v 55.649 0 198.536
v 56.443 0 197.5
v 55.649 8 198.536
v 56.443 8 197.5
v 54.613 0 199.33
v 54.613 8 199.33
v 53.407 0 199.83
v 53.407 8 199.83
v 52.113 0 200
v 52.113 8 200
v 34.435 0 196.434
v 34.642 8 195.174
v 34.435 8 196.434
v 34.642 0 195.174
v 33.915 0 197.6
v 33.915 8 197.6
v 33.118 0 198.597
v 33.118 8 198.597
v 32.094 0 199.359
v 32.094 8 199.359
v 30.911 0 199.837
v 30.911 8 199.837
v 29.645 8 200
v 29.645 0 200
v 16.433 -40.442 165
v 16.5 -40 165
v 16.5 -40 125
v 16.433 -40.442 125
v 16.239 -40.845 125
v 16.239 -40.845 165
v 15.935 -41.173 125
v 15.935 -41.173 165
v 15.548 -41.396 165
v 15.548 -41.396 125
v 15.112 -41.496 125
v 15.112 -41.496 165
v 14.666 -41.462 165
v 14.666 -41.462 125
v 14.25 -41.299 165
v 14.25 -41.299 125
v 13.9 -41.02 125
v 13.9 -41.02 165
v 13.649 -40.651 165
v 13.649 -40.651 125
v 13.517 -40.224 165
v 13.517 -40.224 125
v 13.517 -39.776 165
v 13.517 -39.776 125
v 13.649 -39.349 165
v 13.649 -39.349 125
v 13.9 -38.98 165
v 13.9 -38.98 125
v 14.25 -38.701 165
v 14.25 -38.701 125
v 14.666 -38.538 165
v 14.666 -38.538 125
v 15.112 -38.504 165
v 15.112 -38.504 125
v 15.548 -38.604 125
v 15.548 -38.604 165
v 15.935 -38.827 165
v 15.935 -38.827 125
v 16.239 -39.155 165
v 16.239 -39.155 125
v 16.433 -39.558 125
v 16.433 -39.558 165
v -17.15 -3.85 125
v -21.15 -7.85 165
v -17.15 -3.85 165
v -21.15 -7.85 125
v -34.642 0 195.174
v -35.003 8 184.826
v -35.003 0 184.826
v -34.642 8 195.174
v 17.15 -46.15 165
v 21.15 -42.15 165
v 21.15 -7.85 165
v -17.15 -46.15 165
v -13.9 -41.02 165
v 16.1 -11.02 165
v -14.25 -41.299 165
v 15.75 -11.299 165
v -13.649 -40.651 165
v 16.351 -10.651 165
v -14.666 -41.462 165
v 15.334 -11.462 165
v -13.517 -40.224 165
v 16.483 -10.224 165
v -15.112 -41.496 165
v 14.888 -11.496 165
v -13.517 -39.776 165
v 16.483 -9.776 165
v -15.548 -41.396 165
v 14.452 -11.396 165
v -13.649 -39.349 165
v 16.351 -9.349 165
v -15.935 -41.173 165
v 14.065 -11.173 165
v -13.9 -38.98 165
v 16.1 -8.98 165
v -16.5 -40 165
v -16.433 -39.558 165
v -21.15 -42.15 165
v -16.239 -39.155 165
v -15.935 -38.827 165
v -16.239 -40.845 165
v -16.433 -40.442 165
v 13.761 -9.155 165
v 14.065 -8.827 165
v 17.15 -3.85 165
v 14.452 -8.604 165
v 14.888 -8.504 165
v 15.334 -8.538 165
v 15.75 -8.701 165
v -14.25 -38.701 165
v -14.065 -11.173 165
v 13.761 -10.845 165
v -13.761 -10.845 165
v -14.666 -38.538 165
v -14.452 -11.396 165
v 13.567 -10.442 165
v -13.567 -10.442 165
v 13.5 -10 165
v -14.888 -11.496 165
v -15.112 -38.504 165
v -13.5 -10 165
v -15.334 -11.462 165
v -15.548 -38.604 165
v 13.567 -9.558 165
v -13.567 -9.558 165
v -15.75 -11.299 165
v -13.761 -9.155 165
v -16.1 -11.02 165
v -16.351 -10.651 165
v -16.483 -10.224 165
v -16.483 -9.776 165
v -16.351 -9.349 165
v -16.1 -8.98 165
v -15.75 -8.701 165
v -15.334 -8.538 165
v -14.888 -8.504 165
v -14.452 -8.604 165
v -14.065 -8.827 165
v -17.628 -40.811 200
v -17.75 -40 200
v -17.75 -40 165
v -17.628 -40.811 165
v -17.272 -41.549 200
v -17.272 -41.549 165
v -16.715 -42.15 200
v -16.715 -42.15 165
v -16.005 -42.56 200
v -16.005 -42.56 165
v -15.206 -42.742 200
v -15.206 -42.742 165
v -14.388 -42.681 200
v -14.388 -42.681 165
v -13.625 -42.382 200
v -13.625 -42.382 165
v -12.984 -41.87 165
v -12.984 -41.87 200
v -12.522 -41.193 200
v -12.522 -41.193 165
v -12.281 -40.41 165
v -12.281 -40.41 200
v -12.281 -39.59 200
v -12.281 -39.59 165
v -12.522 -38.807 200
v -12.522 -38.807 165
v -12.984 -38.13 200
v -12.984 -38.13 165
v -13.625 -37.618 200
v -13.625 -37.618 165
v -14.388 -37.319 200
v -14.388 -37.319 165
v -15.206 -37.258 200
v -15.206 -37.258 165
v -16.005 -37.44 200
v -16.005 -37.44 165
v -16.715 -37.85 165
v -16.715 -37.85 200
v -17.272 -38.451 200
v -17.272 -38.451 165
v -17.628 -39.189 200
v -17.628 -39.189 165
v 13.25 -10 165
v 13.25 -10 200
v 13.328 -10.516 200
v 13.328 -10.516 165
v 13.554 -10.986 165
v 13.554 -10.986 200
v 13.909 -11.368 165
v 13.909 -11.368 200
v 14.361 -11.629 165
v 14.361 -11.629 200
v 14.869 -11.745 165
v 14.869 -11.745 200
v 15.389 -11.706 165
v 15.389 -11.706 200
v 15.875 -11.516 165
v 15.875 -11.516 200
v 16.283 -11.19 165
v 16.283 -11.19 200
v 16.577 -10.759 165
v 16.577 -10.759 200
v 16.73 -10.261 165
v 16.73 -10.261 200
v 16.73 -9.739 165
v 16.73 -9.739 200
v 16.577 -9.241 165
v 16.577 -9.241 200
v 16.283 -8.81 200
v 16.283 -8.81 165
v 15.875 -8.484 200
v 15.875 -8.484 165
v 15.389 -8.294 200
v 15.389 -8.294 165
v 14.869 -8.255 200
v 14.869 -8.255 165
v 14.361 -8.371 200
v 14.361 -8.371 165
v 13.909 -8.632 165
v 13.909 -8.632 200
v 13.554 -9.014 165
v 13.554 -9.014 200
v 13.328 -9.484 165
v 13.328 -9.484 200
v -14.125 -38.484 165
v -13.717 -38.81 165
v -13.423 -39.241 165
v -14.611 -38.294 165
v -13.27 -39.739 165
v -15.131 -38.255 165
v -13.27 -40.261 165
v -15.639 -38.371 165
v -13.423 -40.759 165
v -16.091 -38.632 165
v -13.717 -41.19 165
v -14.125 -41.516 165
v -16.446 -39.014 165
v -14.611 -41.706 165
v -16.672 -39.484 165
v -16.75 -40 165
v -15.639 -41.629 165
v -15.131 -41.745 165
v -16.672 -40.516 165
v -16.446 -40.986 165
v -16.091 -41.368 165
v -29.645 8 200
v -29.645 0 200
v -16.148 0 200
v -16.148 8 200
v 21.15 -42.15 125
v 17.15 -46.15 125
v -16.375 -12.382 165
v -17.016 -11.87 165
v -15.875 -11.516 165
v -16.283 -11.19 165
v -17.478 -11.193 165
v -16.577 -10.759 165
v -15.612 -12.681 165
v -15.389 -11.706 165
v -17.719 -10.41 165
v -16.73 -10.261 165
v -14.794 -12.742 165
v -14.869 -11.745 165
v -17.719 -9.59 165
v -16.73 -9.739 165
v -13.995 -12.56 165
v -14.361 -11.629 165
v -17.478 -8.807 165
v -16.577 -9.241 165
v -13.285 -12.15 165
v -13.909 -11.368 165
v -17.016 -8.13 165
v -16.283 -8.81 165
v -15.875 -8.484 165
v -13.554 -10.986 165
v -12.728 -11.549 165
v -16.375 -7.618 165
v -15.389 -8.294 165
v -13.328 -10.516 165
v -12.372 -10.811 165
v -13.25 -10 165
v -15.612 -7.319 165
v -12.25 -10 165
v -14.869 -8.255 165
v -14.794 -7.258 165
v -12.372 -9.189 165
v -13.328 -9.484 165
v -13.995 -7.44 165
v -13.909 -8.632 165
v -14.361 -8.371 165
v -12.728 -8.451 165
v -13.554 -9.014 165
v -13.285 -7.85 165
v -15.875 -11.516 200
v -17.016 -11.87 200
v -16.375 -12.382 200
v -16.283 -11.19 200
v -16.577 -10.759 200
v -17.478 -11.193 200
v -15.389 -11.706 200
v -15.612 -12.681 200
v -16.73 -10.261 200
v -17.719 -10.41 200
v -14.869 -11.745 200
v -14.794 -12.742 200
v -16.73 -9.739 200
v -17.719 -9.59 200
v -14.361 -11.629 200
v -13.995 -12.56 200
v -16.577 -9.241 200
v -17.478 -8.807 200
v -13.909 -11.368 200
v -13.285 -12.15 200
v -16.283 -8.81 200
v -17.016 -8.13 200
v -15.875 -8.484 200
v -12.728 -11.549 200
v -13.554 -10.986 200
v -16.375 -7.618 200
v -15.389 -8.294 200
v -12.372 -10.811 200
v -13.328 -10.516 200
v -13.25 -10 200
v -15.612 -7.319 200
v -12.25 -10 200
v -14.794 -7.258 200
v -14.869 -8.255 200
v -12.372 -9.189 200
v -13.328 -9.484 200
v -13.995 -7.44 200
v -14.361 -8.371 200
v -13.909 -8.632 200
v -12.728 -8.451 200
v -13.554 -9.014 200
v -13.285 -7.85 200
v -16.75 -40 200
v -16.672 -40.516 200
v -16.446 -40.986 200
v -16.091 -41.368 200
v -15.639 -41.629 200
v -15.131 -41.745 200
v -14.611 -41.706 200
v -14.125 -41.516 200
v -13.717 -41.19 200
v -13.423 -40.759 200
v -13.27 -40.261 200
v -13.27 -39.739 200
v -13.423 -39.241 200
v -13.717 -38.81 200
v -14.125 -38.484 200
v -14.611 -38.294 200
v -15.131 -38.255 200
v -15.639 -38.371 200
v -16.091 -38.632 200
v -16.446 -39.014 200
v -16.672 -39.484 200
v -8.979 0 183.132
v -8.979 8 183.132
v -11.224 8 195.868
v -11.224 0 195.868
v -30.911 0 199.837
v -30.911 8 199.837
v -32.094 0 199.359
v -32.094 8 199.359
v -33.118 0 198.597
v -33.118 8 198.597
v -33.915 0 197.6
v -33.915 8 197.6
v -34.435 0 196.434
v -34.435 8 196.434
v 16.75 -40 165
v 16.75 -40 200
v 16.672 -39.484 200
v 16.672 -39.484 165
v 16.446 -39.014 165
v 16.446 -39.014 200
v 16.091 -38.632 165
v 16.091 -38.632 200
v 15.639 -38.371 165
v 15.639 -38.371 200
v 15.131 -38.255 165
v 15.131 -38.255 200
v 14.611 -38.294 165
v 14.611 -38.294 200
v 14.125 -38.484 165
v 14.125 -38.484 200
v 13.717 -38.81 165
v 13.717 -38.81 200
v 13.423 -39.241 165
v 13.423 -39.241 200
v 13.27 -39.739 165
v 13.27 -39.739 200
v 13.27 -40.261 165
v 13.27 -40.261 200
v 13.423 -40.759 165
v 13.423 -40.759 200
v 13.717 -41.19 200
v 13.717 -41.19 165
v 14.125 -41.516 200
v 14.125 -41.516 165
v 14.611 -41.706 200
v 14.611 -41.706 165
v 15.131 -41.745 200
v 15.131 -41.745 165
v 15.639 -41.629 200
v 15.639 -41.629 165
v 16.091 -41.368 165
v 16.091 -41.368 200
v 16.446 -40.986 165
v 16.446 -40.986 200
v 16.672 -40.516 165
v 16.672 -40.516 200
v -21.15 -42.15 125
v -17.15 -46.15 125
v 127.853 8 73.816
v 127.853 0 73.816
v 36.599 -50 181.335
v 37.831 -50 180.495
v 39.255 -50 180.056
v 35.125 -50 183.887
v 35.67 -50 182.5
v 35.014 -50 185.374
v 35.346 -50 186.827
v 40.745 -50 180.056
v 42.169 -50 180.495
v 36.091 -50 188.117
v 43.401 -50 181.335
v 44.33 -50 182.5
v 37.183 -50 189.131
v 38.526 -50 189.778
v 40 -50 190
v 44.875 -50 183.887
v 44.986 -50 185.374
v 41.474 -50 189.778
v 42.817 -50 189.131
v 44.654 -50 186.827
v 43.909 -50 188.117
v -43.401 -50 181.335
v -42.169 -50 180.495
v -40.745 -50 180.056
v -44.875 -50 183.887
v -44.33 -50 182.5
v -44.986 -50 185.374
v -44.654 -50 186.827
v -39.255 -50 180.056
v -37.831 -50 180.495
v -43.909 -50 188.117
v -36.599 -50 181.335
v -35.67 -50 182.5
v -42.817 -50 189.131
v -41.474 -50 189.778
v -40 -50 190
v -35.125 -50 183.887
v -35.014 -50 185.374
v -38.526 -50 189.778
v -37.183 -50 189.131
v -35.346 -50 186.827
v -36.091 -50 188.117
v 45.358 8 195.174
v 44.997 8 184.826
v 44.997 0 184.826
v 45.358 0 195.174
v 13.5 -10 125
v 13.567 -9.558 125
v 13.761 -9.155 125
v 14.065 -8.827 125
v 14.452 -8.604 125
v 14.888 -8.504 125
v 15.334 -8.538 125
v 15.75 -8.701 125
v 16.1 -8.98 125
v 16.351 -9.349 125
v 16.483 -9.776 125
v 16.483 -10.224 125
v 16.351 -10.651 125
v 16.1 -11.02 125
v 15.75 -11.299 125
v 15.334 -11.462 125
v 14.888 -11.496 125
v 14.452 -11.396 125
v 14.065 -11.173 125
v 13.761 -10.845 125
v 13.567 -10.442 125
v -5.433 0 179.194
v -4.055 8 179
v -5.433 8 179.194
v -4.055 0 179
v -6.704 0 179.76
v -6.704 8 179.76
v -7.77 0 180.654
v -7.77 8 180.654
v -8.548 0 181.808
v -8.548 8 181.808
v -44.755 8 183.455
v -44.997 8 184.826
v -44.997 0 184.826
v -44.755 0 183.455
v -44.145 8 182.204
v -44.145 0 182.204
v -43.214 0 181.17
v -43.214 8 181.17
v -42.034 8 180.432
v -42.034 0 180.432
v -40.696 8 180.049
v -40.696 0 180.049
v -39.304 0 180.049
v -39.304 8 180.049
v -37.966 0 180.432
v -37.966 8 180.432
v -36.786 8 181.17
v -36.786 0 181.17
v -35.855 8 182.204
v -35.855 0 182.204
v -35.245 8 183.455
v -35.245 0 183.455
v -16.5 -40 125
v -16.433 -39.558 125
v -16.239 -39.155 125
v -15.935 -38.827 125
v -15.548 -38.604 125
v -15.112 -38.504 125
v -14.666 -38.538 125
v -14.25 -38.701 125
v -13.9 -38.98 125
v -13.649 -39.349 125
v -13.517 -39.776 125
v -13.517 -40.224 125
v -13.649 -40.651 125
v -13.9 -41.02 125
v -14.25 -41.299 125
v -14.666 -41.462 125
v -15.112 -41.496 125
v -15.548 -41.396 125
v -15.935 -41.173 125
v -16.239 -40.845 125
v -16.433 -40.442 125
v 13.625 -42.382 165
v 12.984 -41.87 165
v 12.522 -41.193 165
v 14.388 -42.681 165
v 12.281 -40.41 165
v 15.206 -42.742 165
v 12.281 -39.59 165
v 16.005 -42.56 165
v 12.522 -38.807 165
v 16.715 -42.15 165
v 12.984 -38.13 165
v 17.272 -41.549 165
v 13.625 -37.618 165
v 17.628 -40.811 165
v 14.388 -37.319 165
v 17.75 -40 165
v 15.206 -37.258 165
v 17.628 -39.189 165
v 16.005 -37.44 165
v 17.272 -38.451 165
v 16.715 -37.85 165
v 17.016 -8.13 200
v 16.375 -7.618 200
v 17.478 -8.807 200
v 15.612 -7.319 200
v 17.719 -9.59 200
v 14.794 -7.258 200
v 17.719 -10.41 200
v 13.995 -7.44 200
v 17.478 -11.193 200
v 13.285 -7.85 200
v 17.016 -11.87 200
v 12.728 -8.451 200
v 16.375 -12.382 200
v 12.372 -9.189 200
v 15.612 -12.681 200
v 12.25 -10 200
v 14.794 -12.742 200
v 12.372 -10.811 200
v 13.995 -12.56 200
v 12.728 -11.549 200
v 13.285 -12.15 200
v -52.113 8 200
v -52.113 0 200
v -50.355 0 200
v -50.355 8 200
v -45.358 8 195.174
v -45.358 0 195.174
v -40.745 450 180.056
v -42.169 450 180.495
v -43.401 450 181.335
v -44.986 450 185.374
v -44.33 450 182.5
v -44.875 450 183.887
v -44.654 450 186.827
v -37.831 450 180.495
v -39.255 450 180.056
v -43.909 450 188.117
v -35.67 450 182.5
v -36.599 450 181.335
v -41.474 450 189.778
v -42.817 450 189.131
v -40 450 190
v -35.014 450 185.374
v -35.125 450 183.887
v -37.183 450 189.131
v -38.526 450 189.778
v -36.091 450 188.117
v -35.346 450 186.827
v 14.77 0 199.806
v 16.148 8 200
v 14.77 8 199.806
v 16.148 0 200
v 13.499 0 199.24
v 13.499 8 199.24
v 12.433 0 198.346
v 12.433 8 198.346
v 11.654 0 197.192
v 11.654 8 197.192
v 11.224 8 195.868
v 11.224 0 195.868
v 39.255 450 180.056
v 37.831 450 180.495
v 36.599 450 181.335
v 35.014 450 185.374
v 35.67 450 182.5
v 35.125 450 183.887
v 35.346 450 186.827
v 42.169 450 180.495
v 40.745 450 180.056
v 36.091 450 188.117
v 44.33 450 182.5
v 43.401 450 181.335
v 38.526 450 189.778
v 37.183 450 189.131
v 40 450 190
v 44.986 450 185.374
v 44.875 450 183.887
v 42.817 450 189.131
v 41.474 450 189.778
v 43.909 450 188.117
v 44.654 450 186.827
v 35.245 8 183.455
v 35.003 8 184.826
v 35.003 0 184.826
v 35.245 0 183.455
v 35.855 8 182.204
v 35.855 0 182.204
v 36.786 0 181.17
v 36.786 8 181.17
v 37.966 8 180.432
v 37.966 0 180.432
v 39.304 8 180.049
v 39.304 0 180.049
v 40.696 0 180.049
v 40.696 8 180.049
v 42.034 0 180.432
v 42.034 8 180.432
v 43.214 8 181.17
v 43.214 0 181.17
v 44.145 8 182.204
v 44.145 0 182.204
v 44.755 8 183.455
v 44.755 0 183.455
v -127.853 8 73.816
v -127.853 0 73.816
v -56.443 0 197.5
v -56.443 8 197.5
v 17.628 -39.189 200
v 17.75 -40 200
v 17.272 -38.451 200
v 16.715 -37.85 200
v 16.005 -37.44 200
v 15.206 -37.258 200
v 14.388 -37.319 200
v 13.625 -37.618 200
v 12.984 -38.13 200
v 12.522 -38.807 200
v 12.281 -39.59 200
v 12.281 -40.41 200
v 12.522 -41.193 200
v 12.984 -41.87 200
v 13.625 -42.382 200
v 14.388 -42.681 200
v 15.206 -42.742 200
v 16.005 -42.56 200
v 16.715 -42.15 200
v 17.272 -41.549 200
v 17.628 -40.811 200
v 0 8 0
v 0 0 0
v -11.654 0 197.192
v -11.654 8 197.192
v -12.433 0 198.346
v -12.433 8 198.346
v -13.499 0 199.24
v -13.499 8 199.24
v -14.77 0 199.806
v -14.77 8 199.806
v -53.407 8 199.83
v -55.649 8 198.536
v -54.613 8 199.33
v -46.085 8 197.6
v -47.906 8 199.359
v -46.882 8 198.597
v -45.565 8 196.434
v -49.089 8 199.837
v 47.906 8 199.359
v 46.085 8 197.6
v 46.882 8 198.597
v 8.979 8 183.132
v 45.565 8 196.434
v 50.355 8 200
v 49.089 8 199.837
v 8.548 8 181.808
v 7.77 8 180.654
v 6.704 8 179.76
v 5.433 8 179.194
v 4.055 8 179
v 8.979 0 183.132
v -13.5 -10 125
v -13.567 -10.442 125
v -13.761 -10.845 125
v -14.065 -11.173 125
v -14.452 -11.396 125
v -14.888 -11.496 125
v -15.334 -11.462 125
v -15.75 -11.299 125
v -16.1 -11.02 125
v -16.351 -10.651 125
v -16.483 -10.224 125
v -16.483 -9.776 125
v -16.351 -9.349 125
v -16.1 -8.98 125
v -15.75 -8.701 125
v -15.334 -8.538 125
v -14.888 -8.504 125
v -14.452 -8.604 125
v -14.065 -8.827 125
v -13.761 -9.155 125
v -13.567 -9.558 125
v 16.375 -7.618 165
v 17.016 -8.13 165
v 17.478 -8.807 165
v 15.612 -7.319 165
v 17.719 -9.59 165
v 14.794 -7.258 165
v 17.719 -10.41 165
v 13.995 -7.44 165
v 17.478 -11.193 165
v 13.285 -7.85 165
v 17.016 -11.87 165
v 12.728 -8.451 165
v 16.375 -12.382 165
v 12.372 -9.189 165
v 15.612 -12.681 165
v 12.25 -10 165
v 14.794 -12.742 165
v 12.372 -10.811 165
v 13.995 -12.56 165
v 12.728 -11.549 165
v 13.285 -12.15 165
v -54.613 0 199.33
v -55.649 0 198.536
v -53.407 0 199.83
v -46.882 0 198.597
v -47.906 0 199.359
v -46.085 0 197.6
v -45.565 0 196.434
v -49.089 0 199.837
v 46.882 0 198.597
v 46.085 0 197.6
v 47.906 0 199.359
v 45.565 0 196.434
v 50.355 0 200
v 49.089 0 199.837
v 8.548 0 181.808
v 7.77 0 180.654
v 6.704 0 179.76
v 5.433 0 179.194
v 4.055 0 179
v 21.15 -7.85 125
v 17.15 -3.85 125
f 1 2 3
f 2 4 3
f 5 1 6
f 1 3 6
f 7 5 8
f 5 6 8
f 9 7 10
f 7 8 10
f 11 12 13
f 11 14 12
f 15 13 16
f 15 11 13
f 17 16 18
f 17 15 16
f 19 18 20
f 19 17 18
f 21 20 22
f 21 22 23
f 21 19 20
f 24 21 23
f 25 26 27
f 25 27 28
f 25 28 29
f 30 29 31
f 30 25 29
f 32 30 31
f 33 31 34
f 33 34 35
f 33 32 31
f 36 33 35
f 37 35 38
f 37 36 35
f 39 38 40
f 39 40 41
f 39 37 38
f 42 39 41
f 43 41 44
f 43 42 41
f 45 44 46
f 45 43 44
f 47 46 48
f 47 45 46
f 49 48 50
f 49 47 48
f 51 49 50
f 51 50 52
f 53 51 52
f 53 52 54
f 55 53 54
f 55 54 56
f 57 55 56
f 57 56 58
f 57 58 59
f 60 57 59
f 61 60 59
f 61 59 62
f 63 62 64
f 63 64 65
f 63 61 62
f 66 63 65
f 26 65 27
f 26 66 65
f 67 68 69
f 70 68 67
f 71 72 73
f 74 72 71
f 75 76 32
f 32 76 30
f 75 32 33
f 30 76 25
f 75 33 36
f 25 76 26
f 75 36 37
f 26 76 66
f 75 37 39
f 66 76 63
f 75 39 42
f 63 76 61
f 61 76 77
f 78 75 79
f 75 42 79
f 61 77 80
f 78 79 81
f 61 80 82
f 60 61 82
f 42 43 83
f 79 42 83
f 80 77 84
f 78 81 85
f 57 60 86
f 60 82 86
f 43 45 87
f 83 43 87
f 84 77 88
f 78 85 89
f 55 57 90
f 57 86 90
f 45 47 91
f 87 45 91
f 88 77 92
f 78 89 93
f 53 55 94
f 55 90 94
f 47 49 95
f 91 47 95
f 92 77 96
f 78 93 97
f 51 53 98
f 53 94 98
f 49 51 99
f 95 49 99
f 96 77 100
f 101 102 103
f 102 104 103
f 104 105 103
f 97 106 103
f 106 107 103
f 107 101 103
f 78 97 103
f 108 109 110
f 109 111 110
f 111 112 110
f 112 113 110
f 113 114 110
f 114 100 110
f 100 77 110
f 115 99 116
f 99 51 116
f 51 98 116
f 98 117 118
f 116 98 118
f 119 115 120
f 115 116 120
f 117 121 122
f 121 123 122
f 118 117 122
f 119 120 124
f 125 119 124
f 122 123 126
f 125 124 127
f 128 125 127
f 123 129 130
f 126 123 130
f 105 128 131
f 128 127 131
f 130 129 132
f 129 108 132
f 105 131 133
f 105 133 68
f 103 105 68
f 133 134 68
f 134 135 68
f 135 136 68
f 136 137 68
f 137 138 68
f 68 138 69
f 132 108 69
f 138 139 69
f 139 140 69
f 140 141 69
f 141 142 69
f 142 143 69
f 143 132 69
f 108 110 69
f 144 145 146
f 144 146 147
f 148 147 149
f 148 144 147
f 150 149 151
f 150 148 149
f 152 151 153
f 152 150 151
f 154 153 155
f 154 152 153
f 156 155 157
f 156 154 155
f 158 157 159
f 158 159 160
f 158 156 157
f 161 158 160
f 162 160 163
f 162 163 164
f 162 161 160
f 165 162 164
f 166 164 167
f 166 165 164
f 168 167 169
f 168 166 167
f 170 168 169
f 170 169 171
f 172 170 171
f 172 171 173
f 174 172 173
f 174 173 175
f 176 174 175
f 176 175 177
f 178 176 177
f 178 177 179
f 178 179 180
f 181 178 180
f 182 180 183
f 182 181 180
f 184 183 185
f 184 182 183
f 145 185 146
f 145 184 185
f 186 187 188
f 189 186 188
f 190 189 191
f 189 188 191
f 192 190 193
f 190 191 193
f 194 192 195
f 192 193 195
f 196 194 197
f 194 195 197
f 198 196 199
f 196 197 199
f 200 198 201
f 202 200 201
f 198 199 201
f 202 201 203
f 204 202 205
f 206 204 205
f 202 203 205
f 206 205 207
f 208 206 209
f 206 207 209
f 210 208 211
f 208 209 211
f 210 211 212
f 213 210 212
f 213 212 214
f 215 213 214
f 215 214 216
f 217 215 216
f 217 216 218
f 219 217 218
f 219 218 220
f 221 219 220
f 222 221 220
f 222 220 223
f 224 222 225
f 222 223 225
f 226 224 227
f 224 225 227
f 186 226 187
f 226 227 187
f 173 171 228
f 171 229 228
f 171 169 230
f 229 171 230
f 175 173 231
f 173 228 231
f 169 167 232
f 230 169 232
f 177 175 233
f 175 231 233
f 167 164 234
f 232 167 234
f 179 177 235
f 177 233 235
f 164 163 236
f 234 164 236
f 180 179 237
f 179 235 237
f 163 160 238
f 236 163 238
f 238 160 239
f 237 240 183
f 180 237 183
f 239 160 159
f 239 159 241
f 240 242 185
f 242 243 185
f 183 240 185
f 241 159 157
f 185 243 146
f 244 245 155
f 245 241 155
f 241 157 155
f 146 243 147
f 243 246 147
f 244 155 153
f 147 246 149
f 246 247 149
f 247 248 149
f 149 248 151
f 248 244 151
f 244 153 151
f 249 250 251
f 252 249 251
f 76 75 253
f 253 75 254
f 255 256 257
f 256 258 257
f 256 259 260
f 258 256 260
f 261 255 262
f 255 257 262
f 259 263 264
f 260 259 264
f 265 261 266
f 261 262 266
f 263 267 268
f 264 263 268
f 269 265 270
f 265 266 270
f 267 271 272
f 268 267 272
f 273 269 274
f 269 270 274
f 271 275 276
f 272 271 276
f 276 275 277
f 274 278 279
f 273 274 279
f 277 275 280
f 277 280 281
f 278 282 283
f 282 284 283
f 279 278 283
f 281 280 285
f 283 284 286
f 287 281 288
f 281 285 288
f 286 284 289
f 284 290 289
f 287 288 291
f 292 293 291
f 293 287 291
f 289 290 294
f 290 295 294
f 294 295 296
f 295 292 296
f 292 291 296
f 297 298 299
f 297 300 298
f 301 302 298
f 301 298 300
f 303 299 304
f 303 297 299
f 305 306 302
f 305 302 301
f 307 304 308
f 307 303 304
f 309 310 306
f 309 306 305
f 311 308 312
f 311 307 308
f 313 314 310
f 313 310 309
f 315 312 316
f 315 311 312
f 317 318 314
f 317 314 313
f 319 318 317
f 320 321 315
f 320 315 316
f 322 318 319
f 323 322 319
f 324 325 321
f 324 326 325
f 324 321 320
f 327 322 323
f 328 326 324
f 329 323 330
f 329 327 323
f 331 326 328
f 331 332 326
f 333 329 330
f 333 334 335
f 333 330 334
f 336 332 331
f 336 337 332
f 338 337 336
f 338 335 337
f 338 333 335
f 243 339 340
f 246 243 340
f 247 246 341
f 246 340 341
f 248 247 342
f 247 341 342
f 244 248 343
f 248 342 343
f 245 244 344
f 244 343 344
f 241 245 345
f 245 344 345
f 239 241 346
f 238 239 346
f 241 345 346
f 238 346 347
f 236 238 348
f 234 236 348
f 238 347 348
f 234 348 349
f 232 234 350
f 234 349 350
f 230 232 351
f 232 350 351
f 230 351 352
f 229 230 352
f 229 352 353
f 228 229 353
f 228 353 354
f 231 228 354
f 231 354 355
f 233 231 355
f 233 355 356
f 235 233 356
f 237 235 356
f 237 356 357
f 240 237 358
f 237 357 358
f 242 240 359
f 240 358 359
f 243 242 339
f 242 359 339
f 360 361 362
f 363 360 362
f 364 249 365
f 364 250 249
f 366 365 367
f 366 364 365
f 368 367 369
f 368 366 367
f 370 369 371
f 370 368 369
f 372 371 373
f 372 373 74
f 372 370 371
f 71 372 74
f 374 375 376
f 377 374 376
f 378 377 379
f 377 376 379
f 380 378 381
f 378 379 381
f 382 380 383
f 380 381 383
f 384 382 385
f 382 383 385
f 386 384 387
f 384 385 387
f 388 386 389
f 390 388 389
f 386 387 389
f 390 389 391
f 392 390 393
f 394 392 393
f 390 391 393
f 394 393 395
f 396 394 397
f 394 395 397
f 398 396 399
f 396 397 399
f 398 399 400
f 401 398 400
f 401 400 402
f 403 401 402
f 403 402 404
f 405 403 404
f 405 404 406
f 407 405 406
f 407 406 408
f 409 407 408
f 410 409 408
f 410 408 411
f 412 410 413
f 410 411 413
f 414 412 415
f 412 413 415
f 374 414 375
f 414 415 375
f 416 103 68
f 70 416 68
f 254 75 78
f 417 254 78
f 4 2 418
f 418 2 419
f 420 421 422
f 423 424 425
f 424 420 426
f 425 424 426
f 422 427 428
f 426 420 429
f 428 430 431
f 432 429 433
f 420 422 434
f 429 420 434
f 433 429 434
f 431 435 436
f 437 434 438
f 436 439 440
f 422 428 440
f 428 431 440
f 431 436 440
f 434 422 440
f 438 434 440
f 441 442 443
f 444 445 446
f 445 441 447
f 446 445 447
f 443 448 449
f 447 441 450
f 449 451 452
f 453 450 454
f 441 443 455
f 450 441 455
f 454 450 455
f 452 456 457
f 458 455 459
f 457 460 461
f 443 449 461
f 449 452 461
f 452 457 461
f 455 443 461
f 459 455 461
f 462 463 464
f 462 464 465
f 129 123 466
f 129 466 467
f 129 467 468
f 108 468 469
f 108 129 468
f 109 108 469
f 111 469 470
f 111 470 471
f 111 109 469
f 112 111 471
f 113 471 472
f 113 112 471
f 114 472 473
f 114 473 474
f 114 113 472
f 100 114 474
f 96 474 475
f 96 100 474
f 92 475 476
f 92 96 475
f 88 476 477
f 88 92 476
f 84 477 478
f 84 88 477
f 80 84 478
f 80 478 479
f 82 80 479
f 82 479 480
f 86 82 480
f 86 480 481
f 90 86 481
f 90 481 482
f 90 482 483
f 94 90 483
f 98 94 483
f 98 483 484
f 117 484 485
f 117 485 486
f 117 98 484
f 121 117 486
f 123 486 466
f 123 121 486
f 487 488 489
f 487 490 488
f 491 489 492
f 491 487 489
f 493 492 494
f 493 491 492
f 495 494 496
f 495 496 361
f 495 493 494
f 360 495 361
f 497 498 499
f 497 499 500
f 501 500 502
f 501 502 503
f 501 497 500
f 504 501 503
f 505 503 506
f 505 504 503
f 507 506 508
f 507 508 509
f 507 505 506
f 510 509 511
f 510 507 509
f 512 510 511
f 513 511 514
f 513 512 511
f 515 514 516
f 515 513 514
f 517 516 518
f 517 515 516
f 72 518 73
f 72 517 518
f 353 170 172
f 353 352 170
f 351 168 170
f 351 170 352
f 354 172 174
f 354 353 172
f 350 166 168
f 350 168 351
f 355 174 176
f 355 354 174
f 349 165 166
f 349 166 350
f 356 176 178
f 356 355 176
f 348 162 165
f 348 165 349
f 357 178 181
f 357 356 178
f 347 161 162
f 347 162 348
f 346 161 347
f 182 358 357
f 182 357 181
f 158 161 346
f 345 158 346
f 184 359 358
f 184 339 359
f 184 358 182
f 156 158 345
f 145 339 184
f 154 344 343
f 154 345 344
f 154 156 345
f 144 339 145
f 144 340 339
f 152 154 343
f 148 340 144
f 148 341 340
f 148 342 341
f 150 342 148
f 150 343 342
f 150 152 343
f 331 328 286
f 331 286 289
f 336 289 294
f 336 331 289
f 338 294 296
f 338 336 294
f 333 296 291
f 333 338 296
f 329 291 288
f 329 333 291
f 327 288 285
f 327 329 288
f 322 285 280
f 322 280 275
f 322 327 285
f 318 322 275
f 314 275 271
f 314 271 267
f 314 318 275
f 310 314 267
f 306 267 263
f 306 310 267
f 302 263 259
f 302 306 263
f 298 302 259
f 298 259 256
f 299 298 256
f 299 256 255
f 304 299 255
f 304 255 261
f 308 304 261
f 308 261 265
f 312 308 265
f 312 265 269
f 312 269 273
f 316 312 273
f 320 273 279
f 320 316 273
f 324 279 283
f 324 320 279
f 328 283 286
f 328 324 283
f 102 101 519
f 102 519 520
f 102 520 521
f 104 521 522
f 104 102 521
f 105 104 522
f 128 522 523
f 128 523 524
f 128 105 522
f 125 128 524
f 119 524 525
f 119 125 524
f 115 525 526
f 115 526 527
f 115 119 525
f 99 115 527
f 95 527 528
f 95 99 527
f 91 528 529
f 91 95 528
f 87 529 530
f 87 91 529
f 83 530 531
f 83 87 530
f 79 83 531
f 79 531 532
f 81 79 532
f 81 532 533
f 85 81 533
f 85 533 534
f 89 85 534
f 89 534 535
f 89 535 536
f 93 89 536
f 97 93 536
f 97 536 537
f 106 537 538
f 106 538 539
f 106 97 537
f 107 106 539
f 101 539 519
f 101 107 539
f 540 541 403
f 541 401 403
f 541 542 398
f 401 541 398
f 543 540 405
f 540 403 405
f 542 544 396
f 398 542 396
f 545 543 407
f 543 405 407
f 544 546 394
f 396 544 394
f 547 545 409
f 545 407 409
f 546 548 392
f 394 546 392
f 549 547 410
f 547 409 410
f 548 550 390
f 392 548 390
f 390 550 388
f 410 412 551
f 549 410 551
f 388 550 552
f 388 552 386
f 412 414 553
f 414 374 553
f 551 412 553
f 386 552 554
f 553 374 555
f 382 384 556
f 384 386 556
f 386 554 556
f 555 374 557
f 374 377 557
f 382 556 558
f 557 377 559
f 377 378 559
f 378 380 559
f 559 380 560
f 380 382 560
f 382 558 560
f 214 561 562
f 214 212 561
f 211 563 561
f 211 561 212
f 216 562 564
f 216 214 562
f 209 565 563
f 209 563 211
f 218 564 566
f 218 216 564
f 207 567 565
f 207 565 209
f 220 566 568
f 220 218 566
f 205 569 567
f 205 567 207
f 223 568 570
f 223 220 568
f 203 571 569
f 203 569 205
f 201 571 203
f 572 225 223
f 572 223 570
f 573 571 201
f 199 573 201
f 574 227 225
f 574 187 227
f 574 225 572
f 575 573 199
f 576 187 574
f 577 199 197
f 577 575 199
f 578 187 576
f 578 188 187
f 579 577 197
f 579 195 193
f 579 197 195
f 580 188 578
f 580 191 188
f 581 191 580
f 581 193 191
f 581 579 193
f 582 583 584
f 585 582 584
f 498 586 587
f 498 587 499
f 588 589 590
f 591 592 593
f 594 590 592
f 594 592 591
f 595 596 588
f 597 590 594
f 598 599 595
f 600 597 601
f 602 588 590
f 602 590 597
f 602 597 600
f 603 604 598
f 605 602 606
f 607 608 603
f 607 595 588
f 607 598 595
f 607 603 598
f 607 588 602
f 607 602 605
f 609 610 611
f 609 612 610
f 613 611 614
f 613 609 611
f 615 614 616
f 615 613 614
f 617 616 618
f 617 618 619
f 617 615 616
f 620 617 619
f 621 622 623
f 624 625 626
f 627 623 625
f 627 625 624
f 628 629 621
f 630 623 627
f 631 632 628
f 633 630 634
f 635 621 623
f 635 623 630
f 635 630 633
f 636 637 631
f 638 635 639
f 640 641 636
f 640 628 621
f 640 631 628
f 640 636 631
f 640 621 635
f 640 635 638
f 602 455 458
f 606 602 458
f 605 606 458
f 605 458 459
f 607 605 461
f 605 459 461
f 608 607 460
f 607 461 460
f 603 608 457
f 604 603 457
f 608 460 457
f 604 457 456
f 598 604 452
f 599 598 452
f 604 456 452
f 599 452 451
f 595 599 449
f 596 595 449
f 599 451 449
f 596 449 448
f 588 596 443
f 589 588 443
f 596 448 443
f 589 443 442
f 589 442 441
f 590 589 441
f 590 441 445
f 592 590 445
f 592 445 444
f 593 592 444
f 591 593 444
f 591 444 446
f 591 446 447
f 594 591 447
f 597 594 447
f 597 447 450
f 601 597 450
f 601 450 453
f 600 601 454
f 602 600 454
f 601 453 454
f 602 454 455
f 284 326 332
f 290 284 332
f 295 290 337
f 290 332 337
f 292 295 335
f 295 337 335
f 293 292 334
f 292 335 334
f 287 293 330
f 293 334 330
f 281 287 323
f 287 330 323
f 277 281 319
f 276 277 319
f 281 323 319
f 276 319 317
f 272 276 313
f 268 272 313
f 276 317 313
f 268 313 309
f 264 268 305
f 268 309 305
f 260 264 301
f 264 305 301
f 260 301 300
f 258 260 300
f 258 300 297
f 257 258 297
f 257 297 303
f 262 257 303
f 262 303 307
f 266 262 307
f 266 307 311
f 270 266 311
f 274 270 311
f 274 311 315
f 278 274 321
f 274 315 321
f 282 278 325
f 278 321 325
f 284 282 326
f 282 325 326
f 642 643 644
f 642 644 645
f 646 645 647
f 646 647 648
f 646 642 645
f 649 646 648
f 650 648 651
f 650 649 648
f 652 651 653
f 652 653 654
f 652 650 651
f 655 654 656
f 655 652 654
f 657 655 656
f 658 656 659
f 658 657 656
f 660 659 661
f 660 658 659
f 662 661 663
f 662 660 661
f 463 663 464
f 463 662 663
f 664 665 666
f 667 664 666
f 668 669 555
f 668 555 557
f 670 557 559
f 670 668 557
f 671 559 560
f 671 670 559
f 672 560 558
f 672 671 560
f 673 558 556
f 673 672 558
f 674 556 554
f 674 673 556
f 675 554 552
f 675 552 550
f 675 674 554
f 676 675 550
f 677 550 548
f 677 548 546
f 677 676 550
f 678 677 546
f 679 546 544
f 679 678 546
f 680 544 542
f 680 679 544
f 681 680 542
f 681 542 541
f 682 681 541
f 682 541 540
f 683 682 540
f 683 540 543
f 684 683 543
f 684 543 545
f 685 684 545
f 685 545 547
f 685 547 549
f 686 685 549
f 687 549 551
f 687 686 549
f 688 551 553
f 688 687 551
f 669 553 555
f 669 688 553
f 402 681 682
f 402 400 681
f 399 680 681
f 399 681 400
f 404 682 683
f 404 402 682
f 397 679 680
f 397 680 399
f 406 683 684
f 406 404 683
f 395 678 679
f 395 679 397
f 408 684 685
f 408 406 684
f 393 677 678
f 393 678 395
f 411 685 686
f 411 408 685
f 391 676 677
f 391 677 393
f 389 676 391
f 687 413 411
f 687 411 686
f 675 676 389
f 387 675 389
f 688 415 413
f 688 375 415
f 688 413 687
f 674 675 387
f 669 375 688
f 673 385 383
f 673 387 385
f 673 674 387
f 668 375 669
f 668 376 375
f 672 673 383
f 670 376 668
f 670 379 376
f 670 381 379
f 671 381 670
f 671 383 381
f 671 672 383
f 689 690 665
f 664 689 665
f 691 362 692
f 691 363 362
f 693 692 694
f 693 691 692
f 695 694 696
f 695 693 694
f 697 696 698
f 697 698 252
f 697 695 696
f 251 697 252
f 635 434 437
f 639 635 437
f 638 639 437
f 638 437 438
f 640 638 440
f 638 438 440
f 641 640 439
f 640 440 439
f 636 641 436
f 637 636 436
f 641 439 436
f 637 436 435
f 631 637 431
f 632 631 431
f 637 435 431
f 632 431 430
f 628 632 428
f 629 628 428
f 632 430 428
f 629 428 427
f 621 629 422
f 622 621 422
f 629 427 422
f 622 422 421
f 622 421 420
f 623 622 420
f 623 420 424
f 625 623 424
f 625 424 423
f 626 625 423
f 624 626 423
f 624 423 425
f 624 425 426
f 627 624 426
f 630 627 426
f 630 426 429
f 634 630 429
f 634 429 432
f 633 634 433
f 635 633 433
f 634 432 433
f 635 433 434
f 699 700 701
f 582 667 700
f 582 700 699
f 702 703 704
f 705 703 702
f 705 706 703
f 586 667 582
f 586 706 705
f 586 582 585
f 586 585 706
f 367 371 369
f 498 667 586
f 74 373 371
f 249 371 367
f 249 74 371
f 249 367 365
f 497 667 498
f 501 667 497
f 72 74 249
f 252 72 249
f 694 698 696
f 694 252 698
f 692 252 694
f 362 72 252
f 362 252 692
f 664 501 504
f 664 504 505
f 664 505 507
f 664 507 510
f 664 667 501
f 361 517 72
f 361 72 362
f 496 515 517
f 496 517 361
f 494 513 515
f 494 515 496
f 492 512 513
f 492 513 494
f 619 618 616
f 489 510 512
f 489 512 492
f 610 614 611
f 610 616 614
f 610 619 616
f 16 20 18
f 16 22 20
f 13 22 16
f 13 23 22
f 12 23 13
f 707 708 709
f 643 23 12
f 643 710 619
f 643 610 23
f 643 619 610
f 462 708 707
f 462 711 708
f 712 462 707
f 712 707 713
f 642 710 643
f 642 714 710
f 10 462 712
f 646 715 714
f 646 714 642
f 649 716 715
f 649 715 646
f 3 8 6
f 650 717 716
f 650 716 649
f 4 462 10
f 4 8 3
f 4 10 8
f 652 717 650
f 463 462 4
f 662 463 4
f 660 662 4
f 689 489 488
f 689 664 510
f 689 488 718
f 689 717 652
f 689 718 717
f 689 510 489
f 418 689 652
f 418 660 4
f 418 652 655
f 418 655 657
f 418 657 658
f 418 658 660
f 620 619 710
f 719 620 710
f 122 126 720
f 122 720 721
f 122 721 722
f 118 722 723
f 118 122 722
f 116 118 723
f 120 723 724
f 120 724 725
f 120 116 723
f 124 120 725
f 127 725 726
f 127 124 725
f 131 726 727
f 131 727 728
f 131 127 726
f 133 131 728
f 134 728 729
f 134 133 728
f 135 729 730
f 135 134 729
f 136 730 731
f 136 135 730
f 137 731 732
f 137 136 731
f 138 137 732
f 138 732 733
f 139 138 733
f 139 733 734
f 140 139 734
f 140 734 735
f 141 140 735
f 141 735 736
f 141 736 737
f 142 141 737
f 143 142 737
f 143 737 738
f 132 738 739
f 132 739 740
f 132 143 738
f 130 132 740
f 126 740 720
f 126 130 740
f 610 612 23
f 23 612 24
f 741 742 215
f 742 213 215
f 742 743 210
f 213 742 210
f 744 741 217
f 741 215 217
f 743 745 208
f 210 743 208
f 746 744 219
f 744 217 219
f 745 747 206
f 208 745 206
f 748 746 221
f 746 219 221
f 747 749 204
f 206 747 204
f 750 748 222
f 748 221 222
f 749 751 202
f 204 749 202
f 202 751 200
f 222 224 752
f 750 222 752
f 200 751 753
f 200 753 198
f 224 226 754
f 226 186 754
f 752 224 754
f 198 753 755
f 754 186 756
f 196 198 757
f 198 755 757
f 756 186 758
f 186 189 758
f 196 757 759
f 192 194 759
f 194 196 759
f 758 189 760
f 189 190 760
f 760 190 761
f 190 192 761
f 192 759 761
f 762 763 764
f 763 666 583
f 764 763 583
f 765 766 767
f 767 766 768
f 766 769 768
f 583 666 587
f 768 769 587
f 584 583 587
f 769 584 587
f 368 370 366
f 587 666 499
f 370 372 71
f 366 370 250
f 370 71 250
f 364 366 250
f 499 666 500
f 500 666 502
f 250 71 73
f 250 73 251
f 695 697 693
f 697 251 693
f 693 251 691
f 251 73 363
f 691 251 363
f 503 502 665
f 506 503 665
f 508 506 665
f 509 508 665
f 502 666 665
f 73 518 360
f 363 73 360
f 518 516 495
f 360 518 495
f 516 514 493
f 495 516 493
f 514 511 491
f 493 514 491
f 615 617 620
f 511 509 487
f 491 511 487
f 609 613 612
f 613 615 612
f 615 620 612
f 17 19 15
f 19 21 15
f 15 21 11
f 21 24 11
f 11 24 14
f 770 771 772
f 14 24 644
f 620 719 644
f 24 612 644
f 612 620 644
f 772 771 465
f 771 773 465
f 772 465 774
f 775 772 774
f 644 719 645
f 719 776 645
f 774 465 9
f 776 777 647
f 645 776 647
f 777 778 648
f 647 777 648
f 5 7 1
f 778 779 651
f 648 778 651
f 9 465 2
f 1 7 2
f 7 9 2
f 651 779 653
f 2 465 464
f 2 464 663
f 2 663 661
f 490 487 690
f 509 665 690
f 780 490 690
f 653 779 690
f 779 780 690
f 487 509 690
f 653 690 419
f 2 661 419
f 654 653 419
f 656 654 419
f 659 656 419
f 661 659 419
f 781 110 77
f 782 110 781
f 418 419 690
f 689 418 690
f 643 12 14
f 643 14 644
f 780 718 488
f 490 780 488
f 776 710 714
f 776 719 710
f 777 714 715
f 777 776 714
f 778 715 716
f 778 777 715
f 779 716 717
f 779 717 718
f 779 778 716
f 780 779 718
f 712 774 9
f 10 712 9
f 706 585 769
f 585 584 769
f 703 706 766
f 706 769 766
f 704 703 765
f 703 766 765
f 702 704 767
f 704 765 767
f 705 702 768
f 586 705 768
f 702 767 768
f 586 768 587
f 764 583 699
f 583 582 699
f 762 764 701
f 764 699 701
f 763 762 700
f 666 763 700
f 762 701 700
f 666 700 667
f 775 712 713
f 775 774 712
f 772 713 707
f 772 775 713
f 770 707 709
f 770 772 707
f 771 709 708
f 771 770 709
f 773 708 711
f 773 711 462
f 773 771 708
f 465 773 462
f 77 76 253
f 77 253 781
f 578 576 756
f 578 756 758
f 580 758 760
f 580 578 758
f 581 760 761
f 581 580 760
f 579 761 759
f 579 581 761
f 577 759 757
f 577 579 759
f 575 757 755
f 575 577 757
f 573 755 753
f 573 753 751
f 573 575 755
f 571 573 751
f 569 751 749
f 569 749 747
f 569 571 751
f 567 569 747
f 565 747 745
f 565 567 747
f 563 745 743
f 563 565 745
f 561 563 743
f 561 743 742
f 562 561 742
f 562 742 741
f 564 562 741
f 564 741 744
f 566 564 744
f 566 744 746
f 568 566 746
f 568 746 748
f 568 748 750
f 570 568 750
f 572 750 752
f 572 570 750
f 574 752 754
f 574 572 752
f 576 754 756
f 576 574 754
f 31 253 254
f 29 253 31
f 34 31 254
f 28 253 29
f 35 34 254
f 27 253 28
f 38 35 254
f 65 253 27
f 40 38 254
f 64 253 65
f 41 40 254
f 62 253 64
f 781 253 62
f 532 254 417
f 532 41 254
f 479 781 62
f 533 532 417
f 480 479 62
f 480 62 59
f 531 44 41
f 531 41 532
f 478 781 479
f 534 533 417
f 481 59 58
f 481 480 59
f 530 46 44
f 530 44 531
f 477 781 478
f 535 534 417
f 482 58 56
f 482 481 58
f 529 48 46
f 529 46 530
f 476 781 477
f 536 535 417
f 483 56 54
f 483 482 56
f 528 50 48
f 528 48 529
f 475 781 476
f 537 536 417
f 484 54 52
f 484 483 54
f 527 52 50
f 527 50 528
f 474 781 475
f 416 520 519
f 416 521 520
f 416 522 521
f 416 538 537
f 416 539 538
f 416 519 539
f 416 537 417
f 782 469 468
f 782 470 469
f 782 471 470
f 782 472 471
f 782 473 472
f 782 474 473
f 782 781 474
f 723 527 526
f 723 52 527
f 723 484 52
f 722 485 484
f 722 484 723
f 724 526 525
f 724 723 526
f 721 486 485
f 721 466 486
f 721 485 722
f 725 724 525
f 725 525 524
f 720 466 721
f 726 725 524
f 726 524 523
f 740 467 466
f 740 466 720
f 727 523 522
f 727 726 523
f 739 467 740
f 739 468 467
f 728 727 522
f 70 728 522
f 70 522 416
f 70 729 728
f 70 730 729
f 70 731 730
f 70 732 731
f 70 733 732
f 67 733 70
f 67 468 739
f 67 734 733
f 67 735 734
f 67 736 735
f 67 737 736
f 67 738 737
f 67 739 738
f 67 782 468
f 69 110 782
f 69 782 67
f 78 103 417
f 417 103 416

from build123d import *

# Parameters (mm, degrees)
BOSS_EXTRUDE1_DEPTH        = 8
CUT_EXTRUDE1_DEPTH         = 8
CUT_EXTRUDE2_DEPTH         = 8
FILLET1_R                  = 5
BOSS_EXTRUDE2_DEPTH        = 450
BOSS_EXTRUDE2_DEPTH_BACK   = 50
SKETCH5_R                  = 5
BOSS_EXTRUDE2_2_DEPTH      = 450
BOSS_EXTRUDE2_2_DEPTH_BACK = 50
SKETCH7_R                  = 2.75
SKETCH7_R_2                = 1.75
BOSS_EXTRUDE3_DEPTH        = 35
BOSS_EXTRUDE3_2_DEPTH      = 35
BOSS_EXTRUDE3_3_DEPTH      = 35
BOSS_EXTRUDE3_4_DEPTH      = 35
SKETCH8_W                  = 42.3
SKETCH8_H                  = 42.3
SKETCH8_R                  = 1.5
BOSS_EXTRUDE4_DEPTH        = 40
CHAMFER1_SIZE              = 4


with BuildPart() as part:
    # Sketch2 → Boss-Extrude1 (new body)
    with BuildSketch(Plane(origin=(0, 0, 0), x_dir=(1, 0, 0), z_dir=(0, 1, 0))):
        Polygon((-55, -200), (55, -200), (127.852540378, -73.815698604), (0, 0), (-127.852540378, -73.815698604), align=None)
    extrude(amount=BOSS_EXTRUDE1_DEPTH)

    # Sketch4 → Cut-Extrude1 (cut)
    with BuildSketch(Plane(origin=(0, 8, 0), x_dir=(1, 0, 0), z_dir=(0, 1, 0))):
        with BuildLine():
            Line((44.996954135, -184.825502516), (45.526859264, -200))
            Line((45.526859264, -200), (34.473140736, -200))
            Line((34.473140736, -200), (35.003045865, -184.825502516))
            ThreePointArc((35.003045865, -184.825502516), (40, -180), (44.996954135, -184.825502516))
        make_face()
        with BuildLine():
            Line((-34.473140736, -200), (-45.526859264, -200))
            Line((-45.526859264, -200), (-44.996954135, -184.825502516))
            ThreePointArc((-44.996954135, -184.825502516), (-40, -180), (-35.003045865, -184.825502516))
            Line((-35.003045865, -184.825502516), (-34.473140736, -200))
        make_face()
    extrude(amount=-CUT_EXTRUDE1_DEPTH, mode=Mode.SUBTRACT)

    # Sketch6 → Cut-Extrude2 (cut)
    with BuildSketch(Plane(origin=(0, 8, 0), x_dir=(1, 0, 0), z_dir=(0, 1, 0))):
        Polygon((-8.25, -179), (-11.952866595, -200), (0, -200), (11.952866595, -200), (8.25, -179), align=None)
    extrude(amount=-CUT_EXTRUDE2_DEPTH, mode=Mode.SUBTRACT)

    # Fillet1
    fillet1_edges = [part.edges().sort_by_distance(p)[0] for p in [
        (45.526859264, 4, 200),
        (34.473140736, 4, 200),
        (-34.473140736, 4, 200),
        (-45.526859264, 4, 200),
        (-55, 4, 200),
        (55, 4, 200),
        (-11.952866595, 4, 200),
        (-8.25, 4, 179),
        (11.952866595, 4, 200),
        (8.25, 4, 179),
    ]]
    fillet(fillet1_edges, radius=FILLET1_R)


with BuildPart() as body_2:
    # Sketch5 → Boss-Extrude2 (new, two sides: drawn at the far end of the back side and taken through both)
    with BuildSketch(Plane(origin=(0, 0, 0), x_dir=(1, 0, 0), z_dir=(0, 1, 0)).offset(-BOSS_EXTRUDE2_DEPTH_BACK)):
        with Locations((40, -185)):
            Circle(SKETCH5_R)
    extrude(amount=BOSS_EXTRUDE2_DEPTH + BOSS_EXTRUDE2_DEPTH_BACK)


with BuildPart() as body_3:
    # Sketch5 → Boss-Extrude2 2 (new, two sides: drawn at the far end of the back side and taken through both)
    with BuildSketch(Plane(origin=(0, 0, 0), x_dir=(1, 0, 0), z_dir=(0, 1, 0)).offset(-BOSS_EXTRUDE2_2_DEPTH_BACK)):
        with Locations((-40, -185)):
            Circle(SKETCH5_R)
    extrude(amount=BOSS_EXTRUDE2_2_DEPTH + BOSS_EXTRUDE2_2_DEPTH_BACK)


with BuildPart() as body_4:
    # Sketch7 → Boss-Extrude3 (new body)
    with BuildSketch(Plane.XY.offset(200)):
        with Locations((-15, -10)):
            Circle(SKETCH7_R)
        with Locations((-15, -10)):
            Circle(SKETCH7_R_2, mode=Mode.SUBTRACT)
    extrude(amount=-BOSS_EXTRUDE3_DEPTH)


with BuildPart() as body_5:
    # Sketch7 → Boss-Extrude3 2 (new body)
    with BuildSketch(Plane.XY.offset(200)):
        with Locations((-15, -40)):
            Circle(SKETCH7_R)
        with Locations((-15, -40)):
            Circle(SKETCH7_R_2, mode=Mode.SUBTRACT)
    extrude(amount=-BOSS_EXTRUDE3_2_DEPTH)


with BuildPart() as body_6:
    # Sketch7 → Boss-Extrude3 3 (new body)
    with BuildSketch(Plane.XY.offset(200)):
        with Locations((15, -40)):
            Circle(SKETCH7_R)
        with Locations((15, -40)):
            Circle(SKETCH7_R_2, mode=Mode.SUBTRACT)
    extrude(amount=-BOSS_EXTRUDE3_3_DEPTH)


with BuildPart() as body_7:
    # Sketch7 → Boss-Extrude3 4 (new body)
    with BuildSketch(Plane.XY.offset(200)):
        with Locations((15, -10)):
            Circle(SKETCH7_R)
        with Locations((15, -10)):
            Circle(SKETCH7_R_2, mode=Mode.SUBTRACT)
    extrude(amount=-BOSS_EXTRUDE3_4_DEPTH)


with BuildPart() as body_8:
    # Sketch8 → Boss-Extrude4 (new body)
    with BuildSketch(Plane(origin=(0, 0, 165), x_dir=(-1, 0, 0), z_dir=(0, 0, -1))):
        with Locations((0, -25)):
            Rectangle(SKETCH8_W, SKETCH8_H)
        with Locations((-15, -10)):
            Circle(SKETCH8_R, mode=Mode.SUBTRACT)
        with Locations((-15, -40)):
            Circle(SKETCH8_R, mode=Mode.SUBTRACT)
        with Locations((15, -40)):
            Circle(SKETCH8_R, mode=Mode.SUBTRACT)
        with Locations((15, -10)):
            Circle(SKETCH8_R, mode=Mode.SUBTRACT)
    extrude(amount=BOSS_EXTRUDE4_DEPTH)

    # Chamfer1
    chamfer1_edges = [body_8.edges().sort_by_distance(p)[0] for p in [
        (-21.15, -3.85, 145),
        (-21.15, -46.15, 145),
        (21.15, -3.85, 145),
        (21.15, -46.15, 145),
    ]]
    chamfer(chamfer1_edges, length=CHAMFER1_SIZE)


solid = Compound([part.part, body_2.part, body_3.part, body_4.part, body_5.part, body_6.part, body_7.part, body_8.part])
